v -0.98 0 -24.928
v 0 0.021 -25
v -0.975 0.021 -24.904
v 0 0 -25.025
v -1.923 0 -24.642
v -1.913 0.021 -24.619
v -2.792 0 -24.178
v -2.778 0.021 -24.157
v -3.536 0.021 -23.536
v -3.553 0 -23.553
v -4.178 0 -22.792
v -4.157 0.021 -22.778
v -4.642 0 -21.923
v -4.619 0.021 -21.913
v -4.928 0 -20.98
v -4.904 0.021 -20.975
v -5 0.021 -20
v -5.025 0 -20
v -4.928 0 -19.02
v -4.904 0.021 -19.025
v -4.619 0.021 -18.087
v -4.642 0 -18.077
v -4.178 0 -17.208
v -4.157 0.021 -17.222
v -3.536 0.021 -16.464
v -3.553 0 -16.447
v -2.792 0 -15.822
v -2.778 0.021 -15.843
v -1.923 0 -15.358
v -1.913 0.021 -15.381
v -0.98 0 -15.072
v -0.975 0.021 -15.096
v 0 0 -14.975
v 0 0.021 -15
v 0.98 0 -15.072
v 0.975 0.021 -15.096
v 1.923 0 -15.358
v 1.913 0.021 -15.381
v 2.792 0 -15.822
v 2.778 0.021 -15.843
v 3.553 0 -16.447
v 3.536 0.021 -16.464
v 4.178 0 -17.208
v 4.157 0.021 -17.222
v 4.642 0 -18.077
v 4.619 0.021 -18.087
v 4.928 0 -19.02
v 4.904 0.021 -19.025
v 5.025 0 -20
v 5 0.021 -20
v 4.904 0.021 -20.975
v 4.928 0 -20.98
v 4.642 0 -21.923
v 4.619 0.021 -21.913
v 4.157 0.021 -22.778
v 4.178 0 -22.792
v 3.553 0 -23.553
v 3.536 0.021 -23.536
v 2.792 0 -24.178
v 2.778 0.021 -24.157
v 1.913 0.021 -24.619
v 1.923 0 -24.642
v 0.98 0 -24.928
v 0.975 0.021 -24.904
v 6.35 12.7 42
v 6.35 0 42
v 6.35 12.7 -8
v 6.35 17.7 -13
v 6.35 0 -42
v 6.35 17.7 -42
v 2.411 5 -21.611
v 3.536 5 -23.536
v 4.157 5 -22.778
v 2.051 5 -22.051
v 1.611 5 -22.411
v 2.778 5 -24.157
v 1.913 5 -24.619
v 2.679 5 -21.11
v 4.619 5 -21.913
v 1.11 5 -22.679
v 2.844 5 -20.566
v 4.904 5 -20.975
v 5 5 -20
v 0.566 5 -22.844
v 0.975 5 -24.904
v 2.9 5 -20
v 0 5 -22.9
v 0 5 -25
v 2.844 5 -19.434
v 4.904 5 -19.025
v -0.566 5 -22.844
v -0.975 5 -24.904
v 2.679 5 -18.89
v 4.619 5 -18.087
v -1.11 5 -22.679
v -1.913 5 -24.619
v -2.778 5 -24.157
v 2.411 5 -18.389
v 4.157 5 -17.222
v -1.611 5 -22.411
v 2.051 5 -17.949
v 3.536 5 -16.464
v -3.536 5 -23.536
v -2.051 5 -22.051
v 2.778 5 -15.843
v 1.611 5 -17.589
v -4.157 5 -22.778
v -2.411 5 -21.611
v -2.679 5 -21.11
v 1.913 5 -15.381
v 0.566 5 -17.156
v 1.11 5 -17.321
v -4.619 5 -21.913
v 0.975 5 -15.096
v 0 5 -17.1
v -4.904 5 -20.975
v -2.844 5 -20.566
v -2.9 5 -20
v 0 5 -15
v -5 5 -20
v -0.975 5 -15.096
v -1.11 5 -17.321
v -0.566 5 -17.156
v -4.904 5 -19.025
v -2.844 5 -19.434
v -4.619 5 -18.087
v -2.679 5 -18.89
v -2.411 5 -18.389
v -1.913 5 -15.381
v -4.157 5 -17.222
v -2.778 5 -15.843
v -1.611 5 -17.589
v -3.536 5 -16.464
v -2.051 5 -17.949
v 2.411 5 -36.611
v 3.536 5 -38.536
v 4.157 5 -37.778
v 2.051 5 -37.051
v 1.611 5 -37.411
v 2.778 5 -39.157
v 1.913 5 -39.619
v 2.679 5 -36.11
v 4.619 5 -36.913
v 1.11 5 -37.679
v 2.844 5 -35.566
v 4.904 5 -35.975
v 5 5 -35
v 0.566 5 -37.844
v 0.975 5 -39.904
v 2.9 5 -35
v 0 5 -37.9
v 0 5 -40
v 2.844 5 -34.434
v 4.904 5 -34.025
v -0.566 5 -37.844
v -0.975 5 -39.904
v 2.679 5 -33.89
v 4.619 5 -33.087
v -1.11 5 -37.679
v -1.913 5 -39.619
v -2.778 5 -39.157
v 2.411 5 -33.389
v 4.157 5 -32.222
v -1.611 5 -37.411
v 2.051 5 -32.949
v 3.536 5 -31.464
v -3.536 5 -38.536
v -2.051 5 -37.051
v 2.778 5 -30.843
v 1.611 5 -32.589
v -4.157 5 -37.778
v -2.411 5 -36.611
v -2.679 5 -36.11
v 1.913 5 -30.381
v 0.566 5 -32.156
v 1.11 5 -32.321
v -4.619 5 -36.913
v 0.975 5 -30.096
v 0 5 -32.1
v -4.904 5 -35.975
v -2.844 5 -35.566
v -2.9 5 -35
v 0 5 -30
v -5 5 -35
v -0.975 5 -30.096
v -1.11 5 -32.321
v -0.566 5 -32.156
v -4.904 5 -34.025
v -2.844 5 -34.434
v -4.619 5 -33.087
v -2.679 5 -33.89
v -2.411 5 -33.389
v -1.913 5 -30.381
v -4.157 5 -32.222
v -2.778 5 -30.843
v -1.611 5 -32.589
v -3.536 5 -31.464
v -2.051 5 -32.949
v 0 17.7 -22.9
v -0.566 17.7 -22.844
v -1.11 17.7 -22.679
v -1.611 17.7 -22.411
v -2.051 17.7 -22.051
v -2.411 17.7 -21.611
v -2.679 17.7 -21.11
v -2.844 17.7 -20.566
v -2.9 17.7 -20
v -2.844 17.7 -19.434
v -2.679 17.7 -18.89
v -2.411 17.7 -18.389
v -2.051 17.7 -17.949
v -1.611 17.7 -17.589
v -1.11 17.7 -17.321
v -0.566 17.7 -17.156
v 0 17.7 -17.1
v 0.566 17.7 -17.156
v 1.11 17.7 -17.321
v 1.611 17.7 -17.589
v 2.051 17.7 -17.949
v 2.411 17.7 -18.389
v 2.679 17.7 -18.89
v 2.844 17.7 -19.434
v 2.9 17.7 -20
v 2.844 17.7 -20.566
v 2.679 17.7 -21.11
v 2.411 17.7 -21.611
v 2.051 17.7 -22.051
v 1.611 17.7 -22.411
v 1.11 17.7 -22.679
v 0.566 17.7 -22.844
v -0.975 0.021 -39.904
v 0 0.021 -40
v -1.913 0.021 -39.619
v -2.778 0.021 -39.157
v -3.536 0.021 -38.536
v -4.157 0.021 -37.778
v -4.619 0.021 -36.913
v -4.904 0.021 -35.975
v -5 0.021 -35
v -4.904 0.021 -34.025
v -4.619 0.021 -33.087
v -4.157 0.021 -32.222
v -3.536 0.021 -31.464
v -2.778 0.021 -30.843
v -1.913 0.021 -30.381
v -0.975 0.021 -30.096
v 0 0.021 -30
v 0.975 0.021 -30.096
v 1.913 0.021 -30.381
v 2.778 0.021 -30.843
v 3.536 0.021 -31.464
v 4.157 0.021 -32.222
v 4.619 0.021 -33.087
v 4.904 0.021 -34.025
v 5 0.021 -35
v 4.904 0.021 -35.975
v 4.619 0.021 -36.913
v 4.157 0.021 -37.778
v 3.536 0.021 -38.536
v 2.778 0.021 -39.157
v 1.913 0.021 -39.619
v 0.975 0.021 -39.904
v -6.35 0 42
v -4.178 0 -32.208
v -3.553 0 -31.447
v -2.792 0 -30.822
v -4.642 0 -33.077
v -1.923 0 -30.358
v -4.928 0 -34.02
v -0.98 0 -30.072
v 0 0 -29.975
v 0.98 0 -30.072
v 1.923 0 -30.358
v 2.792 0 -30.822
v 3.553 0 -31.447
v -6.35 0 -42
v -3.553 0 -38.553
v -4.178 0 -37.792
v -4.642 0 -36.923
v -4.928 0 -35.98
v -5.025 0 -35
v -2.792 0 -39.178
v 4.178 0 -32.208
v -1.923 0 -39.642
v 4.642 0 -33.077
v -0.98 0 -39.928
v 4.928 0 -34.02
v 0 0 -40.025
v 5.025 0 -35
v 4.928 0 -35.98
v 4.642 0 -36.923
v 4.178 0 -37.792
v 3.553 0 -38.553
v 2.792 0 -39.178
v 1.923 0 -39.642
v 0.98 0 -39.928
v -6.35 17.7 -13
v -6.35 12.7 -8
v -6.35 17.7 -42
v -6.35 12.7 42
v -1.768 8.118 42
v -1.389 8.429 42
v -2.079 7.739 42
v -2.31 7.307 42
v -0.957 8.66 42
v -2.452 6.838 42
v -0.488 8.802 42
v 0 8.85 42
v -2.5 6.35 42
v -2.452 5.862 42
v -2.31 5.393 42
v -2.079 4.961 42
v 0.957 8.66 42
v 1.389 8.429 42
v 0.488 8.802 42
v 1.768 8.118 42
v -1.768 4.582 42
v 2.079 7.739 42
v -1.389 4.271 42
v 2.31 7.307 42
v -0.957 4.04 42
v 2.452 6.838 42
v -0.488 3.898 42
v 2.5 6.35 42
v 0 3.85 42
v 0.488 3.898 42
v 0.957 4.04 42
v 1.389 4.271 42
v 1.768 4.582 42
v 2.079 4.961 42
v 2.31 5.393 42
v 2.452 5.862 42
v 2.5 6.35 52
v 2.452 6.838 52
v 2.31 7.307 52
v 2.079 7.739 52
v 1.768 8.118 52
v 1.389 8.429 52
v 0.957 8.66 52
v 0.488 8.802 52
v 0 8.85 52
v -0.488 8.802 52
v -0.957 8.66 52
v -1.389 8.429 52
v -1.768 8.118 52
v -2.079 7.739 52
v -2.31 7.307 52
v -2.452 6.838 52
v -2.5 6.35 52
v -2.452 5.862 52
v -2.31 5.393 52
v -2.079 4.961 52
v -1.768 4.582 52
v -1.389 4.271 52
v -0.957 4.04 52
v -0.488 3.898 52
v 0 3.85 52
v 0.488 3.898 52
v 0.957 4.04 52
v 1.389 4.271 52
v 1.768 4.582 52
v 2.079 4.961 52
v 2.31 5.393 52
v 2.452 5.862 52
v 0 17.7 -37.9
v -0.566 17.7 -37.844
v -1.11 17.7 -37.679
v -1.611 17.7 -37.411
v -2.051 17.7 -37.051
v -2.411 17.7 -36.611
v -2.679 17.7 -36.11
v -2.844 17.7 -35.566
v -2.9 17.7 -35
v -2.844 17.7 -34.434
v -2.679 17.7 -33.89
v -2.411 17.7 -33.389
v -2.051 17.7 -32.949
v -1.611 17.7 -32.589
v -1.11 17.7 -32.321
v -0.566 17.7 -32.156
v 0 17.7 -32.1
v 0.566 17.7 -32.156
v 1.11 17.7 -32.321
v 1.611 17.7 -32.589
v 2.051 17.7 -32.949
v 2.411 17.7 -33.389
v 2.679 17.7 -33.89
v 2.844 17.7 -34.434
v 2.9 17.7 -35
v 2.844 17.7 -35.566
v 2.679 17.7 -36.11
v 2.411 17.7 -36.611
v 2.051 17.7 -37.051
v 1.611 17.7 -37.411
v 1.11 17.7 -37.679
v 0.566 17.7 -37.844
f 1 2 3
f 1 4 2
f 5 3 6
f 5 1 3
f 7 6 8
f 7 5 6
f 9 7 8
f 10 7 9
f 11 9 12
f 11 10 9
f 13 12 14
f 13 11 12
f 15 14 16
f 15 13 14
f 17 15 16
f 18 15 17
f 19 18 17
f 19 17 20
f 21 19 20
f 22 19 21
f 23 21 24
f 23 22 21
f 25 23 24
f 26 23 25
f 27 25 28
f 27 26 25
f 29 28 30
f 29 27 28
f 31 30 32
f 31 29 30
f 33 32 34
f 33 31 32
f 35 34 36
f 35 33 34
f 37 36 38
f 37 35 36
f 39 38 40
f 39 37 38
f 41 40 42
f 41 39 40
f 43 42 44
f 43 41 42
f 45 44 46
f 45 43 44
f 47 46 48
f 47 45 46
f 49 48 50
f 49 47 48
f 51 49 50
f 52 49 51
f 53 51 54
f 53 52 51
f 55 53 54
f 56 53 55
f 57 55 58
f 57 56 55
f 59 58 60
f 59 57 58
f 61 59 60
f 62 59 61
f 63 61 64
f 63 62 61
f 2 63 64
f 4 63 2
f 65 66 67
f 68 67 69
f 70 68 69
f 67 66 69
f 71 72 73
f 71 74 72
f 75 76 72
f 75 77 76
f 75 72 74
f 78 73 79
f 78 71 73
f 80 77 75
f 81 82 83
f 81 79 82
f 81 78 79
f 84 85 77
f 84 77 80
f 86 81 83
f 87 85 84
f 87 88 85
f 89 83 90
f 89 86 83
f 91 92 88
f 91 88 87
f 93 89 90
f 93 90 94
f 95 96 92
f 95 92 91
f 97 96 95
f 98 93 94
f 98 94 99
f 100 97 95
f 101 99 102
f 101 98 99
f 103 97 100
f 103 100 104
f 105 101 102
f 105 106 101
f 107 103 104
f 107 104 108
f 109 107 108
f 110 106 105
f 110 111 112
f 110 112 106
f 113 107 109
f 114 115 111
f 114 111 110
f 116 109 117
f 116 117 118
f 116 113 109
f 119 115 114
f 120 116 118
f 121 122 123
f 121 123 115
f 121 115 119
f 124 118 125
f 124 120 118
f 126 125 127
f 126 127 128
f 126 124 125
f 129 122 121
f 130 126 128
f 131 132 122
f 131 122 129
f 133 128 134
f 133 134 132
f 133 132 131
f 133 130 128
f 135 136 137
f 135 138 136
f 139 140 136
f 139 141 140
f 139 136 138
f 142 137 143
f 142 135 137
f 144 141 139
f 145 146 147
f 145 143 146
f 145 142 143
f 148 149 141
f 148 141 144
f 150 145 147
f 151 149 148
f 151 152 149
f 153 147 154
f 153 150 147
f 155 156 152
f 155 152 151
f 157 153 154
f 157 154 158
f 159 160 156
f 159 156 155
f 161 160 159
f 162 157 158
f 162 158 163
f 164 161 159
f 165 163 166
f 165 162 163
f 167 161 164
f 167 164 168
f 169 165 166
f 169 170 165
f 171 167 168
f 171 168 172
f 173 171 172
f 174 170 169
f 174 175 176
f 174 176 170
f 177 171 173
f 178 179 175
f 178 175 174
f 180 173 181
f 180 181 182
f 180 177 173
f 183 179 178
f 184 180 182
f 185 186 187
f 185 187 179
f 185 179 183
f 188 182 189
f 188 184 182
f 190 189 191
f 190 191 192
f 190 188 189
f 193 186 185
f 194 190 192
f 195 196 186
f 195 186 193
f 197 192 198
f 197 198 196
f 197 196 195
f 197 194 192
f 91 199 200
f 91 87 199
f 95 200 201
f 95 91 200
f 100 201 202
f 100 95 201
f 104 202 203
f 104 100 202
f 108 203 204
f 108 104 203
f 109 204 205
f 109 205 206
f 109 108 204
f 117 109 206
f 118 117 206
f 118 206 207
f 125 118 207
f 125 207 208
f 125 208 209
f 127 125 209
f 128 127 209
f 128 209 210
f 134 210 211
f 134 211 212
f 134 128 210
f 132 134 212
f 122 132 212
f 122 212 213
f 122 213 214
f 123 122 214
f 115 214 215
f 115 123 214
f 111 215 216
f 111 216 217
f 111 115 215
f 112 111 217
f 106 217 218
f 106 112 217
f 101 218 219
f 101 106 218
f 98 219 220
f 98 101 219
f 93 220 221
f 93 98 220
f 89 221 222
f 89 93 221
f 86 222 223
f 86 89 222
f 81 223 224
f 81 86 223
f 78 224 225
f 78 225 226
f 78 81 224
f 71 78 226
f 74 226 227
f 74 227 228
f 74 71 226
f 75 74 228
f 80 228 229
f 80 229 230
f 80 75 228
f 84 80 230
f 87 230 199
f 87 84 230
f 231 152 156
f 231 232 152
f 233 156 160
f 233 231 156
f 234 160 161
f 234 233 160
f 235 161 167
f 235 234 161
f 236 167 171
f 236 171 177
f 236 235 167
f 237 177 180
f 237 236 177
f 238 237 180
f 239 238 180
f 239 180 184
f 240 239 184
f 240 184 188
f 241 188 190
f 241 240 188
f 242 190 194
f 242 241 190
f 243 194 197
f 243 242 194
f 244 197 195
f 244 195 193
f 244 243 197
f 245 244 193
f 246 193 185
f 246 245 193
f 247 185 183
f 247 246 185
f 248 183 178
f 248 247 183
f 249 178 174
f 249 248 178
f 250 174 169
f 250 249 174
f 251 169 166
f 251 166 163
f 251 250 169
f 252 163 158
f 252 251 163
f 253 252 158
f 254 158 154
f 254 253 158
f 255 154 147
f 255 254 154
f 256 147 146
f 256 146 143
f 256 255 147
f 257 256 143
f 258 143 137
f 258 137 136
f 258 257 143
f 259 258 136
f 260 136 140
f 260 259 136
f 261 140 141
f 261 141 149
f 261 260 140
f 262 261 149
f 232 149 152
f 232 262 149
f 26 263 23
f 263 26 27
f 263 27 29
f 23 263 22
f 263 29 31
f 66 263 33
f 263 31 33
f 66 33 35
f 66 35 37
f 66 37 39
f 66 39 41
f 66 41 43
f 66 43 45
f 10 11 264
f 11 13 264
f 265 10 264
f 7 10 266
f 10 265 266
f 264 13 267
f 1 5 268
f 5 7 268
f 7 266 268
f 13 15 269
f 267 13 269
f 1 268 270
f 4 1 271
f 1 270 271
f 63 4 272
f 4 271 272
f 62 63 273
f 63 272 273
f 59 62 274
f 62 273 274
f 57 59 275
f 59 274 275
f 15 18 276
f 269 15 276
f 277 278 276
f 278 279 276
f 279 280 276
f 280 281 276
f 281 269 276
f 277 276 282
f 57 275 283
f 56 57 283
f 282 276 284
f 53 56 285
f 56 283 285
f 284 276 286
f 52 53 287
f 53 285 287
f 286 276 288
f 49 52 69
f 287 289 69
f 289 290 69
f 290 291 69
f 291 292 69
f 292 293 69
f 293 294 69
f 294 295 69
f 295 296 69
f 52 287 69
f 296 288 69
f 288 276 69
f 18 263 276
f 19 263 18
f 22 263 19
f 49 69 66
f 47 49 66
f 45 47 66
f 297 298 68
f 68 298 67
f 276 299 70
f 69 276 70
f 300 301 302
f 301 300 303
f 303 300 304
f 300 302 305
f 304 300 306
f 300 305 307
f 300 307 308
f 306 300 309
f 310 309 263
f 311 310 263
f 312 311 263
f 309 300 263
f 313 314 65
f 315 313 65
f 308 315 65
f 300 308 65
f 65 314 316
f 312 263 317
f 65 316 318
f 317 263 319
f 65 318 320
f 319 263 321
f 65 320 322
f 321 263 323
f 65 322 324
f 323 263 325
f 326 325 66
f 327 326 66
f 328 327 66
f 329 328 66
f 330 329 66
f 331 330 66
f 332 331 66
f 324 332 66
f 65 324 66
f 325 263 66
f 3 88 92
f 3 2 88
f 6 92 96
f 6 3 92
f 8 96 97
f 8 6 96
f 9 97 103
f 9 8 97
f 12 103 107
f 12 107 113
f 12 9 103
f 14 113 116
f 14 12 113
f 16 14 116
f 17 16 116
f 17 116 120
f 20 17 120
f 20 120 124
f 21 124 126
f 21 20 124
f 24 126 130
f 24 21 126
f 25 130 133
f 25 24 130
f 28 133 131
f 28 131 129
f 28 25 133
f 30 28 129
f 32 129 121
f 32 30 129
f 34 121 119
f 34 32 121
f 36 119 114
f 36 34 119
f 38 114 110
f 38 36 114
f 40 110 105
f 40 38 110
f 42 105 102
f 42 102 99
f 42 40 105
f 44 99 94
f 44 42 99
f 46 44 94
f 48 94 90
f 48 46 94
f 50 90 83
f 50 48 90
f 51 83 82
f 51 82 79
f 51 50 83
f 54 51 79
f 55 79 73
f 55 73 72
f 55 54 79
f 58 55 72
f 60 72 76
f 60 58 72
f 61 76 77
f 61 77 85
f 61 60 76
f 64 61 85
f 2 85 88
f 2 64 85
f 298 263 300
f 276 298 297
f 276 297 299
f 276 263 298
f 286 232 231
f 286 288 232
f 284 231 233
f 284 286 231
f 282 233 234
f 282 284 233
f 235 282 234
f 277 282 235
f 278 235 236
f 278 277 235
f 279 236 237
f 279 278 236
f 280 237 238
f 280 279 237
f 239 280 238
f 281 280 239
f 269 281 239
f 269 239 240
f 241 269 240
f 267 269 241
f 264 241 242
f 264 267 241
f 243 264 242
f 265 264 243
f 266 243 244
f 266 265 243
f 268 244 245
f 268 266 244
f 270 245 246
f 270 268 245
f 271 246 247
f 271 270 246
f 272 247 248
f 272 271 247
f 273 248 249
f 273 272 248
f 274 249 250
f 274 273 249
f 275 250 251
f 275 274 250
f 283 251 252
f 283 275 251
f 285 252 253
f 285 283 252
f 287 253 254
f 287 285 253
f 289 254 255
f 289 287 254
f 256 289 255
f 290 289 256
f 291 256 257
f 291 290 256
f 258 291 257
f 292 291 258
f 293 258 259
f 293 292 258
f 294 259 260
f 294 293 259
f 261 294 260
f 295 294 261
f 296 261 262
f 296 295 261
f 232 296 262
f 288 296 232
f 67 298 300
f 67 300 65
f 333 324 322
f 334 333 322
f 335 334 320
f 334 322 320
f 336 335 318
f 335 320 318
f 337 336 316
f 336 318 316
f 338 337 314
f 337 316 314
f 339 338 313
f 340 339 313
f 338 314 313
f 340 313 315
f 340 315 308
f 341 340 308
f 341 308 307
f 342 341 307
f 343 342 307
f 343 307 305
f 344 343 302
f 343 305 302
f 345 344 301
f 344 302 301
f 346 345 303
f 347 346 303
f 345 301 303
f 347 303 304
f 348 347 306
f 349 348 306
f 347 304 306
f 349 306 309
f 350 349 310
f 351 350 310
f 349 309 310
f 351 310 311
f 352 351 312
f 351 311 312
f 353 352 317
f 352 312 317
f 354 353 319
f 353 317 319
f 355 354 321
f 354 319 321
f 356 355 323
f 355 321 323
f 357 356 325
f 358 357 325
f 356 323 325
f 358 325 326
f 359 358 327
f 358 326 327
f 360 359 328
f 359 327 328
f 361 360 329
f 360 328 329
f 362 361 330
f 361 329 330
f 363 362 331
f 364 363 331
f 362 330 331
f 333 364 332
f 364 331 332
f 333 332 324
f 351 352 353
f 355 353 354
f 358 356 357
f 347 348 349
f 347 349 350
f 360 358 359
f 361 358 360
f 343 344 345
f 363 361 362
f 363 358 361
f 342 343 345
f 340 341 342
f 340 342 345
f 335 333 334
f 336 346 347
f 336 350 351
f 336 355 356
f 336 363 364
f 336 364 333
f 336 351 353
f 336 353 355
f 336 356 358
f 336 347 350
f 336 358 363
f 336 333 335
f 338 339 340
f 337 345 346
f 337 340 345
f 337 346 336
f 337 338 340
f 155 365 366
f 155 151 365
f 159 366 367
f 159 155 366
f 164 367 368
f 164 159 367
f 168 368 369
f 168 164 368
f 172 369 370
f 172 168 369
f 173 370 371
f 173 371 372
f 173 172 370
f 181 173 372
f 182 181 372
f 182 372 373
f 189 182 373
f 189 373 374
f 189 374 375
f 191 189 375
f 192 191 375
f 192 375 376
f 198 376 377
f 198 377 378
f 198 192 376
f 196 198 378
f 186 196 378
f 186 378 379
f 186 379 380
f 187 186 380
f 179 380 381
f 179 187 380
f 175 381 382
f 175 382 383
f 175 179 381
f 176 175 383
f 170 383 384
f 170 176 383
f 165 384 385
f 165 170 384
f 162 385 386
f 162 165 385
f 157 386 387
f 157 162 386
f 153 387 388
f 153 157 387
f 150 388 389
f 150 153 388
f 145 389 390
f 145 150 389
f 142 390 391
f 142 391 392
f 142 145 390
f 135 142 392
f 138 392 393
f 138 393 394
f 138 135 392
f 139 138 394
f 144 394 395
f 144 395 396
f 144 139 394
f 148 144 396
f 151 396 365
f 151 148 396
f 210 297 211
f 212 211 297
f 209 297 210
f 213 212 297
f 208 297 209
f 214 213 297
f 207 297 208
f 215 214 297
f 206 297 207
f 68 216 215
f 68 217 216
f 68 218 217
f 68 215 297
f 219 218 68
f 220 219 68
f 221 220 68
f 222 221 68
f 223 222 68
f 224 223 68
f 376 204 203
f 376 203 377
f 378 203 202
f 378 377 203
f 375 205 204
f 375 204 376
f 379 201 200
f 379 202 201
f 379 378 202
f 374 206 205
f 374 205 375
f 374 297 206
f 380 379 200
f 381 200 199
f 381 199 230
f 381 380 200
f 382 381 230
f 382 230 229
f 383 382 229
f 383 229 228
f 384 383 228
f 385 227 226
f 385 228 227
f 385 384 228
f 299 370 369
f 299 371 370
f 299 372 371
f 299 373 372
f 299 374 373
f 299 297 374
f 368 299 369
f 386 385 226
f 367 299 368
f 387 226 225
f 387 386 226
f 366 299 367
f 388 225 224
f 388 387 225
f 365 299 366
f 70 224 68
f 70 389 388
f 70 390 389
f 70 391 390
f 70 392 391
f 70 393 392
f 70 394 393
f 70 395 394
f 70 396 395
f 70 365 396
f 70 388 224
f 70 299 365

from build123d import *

# Parameters (mm, degrees)
SKETCH2_W                     = 12.7
SKETCH2_H                     = 84
BOSS_EXTRUDE1_DEPTH           = 12.7
SKETCH5_W                     = 12.7
SKETCH5_H                     = 29
BOSS_EXTRUDE2_DEPTH           = 5
CBORE_FOR_M5_SHCS1_AT_2_COUNT = 2
CBORE_FOR_M5_SHCS1_AT_2_PITCH = 15
CHAMFER1_SIZE                 = 5
SKETCH6_R                     = 2.5
BOSS_EXTRUDE3_DEPTH           = 10


with BuildPart() as part:
    # Sketch2 → Boss-Extrude1 (new body)
    with BuildSketch(Plane(origin=(0, 0, 0), x_dir=(1, 0, 0), z_dir=(0, 1, 0))):
        Rectangle(SKETCH2_W, SKETCH2_H)
    extrude(amount=BOSS_EXTRUDE1_DEPTH)

    # Sketch5 → Boss-Extrude2 (add)
    with BuildSketch(Plane(origin=(0, 12.7, 0), x_dir=(1, 0, 0), z_dir=(0, 1, 0))):
        with Locations((0, 27.5)):
            Rectangle(SKETCH5_W, SKETCH5_H)
    extrude(amount=BOSS_EXTRUDE2_DEPTH)

    # Sketch4 → CBORE for M5 SHCS1 (revolve, cut)
    with BuildSketch(Plane(origin=(0, 0, -35), x_dir=(0, 0, -1), z_dir=(1, 0, 0))):
        Polygon((0, 0), (0, 17.7), (2.9, 17.7), (2.9, 5), (5, 5), (5, 0.020977491), (5.025, 0), align=None)
    cbore_for_m5_shcs1 = revolve(axis=Axis((0, -6.35, -35), (0, 1, 0)), mode=Mode.SUBTRACT)

    # CBORE for M5 SHCS1 at 2: CBORE for M5 SHCS1 ×2
    with Locations(*[(0, 0, i * CBORE_FOR_M5_SHCS1_AT_2_PITCH) for i in range(1, CBORE_FOR_M5_SHCS1_AT_2_COUNT)]):
        add(cbore_for_m5_shcs1, mode=Mode.SUBTRACT)

    # Chamfer1
    chamfer1_edges = [part.edges().sort_by_distance(p)[0] for p in [
        (0, 12.7, -13),
    ]]
    chamfer(chamfer1_edges, length=CHAMFER1_SIZE - 0.0001)  # a hair under: the kernel refuses the full size

    # Sketch6 → Boss-Extrude3 (add)
    with BuildSketch(Plane.XY.offset(42)):
        with Locations((0, 6.35)):
            Circle(SKETCH6_R)
    extrude(amount=BOSS_EXTRUDE3_DEPTH)


solid = part.part
